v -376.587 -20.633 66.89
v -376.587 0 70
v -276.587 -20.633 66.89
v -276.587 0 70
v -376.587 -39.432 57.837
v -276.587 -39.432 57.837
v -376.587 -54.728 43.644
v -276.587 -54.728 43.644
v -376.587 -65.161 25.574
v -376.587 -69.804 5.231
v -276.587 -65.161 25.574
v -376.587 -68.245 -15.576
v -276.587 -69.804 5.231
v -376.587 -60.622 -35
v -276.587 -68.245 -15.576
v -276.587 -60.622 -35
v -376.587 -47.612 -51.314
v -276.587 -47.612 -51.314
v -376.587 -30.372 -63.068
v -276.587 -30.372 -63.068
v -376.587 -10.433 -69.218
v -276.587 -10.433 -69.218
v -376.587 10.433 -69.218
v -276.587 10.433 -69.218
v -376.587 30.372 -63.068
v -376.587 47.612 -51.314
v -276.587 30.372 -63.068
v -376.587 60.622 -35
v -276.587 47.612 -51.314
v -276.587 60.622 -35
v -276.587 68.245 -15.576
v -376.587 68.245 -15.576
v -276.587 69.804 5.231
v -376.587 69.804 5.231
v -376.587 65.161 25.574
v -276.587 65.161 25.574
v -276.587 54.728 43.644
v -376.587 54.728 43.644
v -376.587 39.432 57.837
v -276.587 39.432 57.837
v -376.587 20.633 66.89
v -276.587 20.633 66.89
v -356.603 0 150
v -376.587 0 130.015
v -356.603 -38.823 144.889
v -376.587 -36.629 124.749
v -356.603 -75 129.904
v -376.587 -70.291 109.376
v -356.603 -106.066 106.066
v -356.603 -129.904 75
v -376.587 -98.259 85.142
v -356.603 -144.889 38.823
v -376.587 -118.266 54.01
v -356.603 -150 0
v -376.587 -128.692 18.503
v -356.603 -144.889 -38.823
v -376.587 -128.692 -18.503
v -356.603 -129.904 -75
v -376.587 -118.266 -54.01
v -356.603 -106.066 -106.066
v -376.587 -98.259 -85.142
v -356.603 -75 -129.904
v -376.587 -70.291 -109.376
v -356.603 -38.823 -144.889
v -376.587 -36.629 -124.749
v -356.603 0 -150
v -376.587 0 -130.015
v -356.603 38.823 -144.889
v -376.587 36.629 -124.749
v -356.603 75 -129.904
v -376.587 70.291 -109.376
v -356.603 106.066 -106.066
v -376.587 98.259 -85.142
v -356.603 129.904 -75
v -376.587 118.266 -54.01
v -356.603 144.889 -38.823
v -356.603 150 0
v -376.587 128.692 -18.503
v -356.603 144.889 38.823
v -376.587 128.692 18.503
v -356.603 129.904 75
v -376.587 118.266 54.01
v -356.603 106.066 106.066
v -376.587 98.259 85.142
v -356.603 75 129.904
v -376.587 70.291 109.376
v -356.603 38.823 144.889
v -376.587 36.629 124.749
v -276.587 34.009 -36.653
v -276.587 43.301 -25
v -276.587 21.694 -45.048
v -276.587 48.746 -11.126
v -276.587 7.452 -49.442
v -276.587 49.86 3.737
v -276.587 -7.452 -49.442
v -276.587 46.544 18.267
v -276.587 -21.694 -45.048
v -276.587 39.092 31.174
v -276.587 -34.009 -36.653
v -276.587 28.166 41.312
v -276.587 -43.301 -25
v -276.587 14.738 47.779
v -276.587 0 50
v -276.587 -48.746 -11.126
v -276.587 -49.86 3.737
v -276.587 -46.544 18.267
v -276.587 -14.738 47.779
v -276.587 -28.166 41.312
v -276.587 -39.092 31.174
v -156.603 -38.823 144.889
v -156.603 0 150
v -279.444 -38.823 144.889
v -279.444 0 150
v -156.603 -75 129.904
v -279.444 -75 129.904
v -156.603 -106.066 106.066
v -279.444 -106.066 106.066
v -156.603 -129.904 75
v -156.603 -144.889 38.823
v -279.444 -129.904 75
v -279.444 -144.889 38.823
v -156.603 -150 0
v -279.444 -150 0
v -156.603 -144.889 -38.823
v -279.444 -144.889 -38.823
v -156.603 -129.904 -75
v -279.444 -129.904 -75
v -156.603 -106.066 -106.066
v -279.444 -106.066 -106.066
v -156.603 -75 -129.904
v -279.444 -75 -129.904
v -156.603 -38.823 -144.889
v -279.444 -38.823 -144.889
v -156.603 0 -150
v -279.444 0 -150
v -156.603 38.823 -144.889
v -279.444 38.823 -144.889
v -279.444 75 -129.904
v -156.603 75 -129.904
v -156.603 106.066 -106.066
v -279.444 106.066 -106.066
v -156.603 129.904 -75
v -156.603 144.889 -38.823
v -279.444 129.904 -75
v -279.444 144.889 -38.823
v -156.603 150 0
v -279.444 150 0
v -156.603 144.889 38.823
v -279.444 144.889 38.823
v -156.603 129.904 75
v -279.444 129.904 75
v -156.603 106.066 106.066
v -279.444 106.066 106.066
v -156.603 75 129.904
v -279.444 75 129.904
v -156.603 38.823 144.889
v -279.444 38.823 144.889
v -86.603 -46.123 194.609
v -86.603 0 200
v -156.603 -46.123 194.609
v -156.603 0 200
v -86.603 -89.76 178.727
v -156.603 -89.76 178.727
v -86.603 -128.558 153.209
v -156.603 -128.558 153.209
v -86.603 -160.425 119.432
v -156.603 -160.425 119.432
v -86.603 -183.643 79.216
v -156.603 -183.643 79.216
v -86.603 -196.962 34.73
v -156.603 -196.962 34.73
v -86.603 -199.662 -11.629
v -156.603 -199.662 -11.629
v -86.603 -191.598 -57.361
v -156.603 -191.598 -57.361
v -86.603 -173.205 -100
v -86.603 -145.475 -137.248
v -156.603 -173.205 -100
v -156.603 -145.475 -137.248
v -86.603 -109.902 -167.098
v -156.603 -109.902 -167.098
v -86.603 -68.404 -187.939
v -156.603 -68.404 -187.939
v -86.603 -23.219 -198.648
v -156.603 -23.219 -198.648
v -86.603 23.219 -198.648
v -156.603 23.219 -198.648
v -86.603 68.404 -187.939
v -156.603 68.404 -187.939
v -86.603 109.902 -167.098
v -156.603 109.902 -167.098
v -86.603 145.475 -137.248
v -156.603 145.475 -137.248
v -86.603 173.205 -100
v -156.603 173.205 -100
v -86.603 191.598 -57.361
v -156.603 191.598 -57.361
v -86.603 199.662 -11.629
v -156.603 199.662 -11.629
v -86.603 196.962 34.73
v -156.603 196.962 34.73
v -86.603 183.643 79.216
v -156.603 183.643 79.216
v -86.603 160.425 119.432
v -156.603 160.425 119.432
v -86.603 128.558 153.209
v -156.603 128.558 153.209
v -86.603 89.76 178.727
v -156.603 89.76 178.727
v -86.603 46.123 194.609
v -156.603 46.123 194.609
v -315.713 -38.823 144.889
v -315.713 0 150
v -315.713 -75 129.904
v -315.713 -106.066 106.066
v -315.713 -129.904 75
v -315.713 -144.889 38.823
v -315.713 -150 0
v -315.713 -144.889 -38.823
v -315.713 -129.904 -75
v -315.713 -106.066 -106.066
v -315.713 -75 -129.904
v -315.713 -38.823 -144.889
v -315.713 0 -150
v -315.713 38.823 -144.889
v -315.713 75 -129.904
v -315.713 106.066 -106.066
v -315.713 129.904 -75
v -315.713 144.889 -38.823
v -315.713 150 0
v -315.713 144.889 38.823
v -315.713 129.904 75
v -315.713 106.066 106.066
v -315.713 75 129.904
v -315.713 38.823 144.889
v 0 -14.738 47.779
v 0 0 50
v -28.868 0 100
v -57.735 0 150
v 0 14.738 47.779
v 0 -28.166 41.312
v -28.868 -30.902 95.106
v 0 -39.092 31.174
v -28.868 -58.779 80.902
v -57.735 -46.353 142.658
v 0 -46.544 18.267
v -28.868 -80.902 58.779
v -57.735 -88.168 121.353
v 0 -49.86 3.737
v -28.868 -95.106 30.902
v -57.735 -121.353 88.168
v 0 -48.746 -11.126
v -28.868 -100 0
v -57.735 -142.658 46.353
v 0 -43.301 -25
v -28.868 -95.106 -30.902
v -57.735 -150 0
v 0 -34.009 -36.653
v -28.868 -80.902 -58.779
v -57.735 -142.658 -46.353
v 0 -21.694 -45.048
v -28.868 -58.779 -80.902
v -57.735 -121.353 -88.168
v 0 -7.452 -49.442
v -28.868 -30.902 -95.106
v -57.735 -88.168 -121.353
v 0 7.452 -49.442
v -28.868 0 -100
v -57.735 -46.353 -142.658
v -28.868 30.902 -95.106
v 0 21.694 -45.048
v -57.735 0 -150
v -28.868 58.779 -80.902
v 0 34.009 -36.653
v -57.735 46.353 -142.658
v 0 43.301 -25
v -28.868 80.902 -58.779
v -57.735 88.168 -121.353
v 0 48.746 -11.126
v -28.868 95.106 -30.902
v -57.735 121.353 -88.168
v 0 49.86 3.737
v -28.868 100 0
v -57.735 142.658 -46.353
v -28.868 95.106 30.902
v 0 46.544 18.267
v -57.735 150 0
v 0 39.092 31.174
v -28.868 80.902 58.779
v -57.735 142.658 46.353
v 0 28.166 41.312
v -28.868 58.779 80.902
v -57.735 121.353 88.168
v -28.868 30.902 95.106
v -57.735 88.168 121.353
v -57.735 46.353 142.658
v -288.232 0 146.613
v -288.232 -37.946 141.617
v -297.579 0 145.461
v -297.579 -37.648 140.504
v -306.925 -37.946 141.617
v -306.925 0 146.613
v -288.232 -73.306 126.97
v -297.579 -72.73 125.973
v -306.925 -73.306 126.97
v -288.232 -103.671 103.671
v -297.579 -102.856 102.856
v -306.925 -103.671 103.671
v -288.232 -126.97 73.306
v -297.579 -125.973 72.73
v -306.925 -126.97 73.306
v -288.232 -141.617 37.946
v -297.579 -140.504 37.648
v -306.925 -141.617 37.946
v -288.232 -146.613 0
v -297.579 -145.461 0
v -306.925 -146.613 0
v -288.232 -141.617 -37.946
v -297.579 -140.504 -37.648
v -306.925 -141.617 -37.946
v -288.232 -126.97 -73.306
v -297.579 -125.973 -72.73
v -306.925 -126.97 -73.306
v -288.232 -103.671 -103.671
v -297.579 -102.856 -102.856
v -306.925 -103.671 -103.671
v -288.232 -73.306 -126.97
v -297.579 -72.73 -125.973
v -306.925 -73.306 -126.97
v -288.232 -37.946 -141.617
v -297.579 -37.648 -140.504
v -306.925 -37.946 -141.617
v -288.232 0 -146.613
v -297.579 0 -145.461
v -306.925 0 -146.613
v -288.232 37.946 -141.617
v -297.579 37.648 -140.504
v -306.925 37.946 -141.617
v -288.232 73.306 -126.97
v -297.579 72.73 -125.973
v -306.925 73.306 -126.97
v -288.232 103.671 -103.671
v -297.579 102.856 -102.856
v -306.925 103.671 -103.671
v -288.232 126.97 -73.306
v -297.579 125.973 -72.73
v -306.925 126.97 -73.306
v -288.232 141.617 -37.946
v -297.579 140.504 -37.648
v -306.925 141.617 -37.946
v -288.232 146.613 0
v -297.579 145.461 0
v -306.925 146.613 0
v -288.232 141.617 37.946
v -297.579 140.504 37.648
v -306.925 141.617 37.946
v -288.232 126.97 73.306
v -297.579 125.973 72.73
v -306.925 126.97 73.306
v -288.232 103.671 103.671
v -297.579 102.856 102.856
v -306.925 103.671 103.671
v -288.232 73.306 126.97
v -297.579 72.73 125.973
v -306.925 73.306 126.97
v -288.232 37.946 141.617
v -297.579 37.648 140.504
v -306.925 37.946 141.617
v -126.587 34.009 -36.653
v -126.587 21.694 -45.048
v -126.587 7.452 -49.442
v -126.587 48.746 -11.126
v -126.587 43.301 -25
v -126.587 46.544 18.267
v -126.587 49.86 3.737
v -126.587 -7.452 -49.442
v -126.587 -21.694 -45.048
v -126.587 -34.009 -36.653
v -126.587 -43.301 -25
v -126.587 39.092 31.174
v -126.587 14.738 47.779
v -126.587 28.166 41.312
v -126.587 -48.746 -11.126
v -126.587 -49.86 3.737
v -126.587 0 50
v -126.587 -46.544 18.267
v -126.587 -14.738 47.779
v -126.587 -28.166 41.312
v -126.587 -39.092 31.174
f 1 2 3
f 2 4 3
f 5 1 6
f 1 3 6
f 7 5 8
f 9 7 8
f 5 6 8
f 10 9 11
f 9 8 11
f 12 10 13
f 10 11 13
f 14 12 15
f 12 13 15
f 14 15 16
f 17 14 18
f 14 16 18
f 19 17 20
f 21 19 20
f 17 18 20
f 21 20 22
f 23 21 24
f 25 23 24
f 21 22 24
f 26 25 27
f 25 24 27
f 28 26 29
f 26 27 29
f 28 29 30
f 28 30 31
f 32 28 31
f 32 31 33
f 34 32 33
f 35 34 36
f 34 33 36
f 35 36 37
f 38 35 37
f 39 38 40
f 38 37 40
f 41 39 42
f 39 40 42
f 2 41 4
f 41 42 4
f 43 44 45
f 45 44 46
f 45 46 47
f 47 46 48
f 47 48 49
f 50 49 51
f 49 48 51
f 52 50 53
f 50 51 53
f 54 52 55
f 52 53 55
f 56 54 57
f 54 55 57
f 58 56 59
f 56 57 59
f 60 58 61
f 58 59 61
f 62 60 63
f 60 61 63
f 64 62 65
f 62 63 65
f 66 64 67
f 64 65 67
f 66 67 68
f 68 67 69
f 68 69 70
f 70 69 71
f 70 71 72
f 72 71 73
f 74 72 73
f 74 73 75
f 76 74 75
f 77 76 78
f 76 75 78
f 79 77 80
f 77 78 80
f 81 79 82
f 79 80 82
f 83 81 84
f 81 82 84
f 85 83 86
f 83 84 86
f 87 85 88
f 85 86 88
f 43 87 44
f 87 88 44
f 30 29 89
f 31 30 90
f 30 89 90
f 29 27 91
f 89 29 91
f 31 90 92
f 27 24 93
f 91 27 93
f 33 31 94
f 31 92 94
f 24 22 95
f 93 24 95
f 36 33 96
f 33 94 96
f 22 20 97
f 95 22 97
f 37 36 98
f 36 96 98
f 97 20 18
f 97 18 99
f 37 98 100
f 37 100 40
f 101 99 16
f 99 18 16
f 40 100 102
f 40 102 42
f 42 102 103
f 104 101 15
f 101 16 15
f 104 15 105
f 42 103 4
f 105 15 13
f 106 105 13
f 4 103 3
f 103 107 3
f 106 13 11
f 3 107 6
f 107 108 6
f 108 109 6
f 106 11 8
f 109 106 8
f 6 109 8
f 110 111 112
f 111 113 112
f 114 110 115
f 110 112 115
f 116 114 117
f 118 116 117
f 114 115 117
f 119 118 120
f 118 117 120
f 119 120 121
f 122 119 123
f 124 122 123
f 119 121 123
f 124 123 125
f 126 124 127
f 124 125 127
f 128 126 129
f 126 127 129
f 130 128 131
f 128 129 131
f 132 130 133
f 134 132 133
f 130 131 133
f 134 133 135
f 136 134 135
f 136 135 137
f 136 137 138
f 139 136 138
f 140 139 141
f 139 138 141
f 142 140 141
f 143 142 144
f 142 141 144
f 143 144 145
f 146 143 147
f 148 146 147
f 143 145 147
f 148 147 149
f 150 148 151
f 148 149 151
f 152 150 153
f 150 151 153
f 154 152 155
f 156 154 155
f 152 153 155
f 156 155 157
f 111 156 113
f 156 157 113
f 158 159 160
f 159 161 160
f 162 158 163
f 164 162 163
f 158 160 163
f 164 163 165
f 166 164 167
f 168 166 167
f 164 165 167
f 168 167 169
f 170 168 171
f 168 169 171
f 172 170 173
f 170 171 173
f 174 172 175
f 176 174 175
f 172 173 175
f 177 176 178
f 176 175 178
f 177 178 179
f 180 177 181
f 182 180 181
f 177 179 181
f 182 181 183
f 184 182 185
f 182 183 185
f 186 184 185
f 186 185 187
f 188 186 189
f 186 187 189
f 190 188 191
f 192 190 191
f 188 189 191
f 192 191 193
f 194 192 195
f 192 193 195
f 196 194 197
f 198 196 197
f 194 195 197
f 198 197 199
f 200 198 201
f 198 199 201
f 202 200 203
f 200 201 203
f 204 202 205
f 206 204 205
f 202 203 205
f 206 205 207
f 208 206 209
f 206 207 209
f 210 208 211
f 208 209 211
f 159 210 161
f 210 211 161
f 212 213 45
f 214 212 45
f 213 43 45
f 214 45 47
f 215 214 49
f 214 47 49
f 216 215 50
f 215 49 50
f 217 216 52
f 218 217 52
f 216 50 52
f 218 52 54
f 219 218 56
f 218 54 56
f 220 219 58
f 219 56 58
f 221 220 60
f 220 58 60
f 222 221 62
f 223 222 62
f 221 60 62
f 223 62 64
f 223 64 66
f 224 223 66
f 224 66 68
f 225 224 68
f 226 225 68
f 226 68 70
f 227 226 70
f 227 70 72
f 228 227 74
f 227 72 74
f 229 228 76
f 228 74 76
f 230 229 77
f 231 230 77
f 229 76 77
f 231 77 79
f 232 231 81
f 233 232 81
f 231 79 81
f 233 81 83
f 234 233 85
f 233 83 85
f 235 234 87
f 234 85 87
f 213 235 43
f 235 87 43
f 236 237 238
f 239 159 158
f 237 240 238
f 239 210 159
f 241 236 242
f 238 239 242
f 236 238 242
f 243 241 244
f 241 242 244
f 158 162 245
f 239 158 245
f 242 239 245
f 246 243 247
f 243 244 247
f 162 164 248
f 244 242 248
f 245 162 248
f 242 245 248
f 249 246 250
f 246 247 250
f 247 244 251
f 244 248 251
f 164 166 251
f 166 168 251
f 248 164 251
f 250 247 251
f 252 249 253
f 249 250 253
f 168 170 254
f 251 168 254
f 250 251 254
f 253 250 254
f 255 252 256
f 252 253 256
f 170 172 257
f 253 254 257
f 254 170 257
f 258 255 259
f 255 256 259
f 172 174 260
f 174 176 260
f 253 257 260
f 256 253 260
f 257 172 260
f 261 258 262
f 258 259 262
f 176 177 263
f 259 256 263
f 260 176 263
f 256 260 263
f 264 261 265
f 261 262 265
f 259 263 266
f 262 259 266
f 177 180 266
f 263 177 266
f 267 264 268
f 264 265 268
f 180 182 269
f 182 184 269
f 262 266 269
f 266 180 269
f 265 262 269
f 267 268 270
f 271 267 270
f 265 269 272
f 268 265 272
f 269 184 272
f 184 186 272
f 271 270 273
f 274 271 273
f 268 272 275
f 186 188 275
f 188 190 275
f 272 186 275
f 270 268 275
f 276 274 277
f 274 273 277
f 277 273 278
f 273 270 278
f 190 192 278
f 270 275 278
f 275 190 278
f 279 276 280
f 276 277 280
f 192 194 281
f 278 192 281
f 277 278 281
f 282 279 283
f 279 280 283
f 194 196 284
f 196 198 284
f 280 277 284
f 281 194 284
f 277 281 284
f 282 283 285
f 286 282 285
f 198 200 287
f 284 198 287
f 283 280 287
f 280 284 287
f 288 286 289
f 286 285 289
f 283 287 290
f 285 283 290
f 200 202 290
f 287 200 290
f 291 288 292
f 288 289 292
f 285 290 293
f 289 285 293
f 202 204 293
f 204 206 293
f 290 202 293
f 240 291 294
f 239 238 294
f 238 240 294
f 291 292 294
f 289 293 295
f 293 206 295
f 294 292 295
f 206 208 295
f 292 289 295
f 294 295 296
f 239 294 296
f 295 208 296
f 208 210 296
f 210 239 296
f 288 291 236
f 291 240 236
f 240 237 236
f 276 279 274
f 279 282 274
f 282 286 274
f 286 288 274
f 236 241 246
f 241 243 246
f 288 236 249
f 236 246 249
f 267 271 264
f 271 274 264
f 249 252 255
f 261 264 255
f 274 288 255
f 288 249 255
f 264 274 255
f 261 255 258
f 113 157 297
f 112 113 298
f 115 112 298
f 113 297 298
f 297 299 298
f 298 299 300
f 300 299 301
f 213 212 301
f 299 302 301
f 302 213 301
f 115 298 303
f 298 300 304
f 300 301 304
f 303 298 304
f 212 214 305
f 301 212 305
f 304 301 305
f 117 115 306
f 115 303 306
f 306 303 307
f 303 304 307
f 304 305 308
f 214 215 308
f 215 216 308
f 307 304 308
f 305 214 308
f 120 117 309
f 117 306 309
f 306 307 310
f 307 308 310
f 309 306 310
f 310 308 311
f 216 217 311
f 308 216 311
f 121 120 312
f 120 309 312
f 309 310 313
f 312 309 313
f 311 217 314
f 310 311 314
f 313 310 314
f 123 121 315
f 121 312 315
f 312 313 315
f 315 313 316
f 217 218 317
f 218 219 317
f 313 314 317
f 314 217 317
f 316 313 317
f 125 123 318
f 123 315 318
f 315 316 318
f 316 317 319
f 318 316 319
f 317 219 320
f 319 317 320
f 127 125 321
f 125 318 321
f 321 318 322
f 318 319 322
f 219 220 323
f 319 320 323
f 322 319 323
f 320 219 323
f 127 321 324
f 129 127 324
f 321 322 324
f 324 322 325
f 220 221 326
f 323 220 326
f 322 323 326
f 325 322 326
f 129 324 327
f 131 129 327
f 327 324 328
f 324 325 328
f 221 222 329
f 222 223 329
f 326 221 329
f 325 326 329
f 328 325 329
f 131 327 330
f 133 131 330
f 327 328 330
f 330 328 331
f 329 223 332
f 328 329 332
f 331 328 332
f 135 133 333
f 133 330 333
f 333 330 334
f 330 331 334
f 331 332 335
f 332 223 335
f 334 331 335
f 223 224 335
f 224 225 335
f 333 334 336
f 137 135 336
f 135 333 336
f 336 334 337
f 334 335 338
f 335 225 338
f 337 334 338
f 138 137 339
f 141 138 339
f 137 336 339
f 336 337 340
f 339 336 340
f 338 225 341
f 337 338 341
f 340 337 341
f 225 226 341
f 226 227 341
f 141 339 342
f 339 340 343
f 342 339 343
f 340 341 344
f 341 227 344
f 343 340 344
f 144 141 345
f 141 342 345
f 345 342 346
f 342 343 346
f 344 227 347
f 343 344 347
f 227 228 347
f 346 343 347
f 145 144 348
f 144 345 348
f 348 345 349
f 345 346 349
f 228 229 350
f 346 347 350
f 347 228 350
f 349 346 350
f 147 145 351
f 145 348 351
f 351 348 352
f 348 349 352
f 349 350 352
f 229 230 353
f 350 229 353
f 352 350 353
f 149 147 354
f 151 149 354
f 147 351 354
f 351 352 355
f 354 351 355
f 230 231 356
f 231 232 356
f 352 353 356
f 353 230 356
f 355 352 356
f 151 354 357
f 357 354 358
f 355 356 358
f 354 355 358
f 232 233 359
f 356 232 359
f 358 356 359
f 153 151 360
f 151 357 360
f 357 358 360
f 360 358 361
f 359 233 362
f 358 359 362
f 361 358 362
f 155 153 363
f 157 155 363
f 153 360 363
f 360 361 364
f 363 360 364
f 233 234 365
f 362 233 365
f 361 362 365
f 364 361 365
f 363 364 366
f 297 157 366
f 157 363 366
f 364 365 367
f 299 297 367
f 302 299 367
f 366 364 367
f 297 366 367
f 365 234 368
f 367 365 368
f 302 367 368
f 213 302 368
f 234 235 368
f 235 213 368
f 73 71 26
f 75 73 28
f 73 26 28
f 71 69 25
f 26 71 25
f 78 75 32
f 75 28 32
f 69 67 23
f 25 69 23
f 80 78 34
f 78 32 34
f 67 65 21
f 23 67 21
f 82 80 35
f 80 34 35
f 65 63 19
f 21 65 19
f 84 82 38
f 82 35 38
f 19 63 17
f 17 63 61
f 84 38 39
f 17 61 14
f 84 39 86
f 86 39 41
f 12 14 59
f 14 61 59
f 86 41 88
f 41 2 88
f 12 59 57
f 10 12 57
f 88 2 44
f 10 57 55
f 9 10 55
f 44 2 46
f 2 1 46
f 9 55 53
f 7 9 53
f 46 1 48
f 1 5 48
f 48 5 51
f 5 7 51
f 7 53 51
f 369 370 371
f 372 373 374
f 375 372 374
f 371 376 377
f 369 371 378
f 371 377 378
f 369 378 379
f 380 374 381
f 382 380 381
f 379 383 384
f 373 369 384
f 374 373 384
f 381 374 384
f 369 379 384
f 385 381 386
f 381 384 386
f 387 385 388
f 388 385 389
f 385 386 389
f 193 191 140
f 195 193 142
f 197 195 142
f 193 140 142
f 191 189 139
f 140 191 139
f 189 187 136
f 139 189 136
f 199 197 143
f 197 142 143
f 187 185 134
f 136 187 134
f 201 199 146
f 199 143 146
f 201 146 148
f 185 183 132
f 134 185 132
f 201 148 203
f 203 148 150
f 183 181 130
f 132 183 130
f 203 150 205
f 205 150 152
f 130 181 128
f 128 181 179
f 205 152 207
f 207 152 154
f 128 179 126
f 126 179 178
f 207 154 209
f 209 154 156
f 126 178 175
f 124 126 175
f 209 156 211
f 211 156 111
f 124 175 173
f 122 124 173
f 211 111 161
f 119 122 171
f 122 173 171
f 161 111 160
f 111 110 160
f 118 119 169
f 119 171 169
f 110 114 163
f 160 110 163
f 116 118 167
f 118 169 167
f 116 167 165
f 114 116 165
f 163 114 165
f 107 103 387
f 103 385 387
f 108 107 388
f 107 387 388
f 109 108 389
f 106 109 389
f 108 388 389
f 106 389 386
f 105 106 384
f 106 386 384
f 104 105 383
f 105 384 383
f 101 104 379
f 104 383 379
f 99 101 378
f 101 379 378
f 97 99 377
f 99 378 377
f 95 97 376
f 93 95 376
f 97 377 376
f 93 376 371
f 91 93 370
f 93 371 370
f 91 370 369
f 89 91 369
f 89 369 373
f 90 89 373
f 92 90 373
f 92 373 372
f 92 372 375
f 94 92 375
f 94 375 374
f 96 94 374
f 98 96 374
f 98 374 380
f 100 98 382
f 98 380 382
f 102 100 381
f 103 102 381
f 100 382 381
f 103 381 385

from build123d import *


with BuildPart() as f1:
    # F0 (on Front) → F1 (revolve)
    with BuildSketch(Plane.XZ):
        with BuildLine():
            Line((-126.587485, 0), (0, 0))
            Line((0, 0), (0, 50))
            Line((0, 50), (-86.60254, 200))
            Line((-86.60254, 200), (-156.60254, 200))
            Line((-156.60254, 200), (-156.60254, 150))
            Line((-156.60254, 150), (-276.463263, 150))
            Line((-276.463263, 150), (-279.444389, 150))
            ThreePointArc((-279.444389, 150), (-297.578514, 145.460746), (-315.712638, 150))
            Line((-315.712638, 150), (-356.60254, 150))
            Line((-356.60254, 150), (-376.587485, 130.015055))
            Line((-376.587485, 130.015055), (-376.587485, 70))
            Line((-376.587485, 70), (-276.587485, 70))
            Line((-276.587485, 70), (-276.587485, 50))
            Line((-276.587485, 50), (-126.587485, 50))
            Line((-126.587485, 50), (-126.587485, 0))
        make_face()
    revolve(axis=Axis((-63.293743, 0, 0), (1, 0, 0)))


solid = f1.part
